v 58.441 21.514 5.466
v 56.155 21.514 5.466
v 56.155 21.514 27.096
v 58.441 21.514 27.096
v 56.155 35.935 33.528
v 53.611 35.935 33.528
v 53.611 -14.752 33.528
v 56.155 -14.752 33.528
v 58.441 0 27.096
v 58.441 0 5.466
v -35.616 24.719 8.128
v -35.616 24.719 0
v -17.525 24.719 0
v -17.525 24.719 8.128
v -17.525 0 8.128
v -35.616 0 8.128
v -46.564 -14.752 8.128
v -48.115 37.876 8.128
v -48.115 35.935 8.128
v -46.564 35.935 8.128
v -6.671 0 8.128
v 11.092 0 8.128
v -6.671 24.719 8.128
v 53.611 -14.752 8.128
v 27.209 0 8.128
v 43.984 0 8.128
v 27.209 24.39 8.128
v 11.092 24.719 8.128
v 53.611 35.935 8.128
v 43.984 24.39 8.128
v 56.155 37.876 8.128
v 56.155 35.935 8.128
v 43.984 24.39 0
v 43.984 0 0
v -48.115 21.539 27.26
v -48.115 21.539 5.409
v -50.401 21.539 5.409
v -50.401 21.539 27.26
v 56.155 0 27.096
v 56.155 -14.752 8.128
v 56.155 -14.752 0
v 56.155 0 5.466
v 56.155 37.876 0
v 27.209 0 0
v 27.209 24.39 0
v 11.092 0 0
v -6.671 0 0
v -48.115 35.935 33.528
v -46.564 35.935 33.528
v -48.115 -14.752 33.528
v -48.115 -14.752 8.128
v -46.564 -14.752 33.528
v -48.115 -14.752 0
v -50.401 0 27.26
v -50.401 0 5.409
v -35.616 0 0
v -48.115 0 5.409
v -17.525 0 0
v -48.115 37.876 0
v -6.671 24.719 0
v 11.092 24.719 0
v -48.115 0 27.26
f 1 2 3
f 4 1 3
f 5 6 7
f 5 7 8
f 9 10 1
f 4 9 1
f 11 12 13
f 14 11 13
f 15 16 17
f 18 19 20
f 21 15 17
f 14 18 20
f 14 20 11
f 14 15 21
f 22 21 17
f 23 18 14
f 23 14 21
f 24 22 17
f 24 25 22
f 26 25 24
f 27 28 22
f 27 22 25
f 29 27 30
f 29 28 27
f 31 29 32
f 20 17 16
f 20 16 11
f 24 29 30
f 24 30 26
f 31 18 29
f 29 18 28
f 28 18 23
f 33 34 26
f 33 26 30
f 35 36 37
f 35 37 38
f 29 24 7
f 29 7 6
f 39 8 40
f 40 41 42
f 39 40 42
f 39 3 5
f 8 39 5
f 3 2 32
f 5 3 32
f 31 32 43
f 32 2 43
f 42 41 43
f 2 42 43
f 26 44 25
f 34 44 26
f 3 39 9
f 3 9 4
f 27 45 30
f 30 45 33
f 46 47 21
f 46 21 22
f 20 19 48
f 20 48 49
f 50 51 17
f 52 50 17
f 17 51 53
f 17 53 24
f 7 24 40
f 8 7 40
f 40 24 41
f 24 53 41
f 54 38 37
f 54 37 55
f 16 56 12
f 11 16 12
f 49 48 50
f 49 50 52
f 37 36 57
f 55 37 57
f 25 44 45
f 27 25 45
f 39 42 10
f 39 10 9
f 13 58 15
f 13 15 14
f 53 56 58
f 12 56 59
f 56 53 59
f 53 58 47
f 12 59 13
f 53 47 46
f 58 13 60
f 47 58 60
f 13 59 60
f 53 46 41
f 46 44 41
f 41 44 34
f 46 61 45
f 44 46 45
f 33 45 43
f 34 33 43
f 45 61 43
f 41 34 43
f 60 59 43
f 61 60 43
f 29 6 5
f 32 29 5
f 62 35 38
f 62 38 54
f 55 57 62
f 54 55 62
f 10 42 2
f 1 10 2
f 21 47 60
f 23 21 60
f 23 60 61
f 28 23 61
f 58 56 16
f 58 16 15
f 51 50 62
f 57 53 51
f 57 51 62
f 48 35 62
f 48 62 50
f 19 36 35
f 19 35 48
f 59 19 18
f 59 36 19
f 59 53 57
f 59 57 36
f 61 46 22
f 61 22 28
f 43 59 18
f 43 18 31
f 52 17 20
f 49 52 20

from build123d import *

# Parameters (mm, degrees)
F0_W     = 104.2701750994
F0_H     = 52.628479898
F0_W_2   = 18.0910397321
F0_H_2   = 24.7193295509
F0_W_3   = 17.7621119656
F0_W_4   = 16.775328666
F0_H_3   = 24.3904013187
F1_DEPTH = 8.128
F2_W     = 1.5516094863
F2_H     = 50.6867542863
F2_W_2   = 2.5433897972
F3_DEPTH = 25.4
F4_W     = 21.5143151581
F4_H     = 21.6306117363
F6_DEPTH = 2.286
F5_W     = 21.539459005
F5_H     = 21.8509552069
F7_DEPTH = 2.286


with BuildPart() as f1:
    # F0 (on Top) → F1 (new body)
    with BuildSketch(Plane.XY):
        with Locations((4.019651562, 11.5622095764)):
            Rectangle(F0_W, F0_H)
        with Locations((-26.5706507489, 12.3596647754)):
            Rectangle(F0_W_2, F0_H_2, mode=Mode.SUBTRACT)
        with Locations((2.2105479147, 12.3596647754)):
            Rectangle(F0_W_3, F0_H_2, mode=Mode.SUBTRACT)
        with Locations((35.5967376381, 12.1952006593)):
            Rectangle(F0_W_4, F0_H_3, mode=Mode.SUBTRACT)
    extrude(amount=F1_DEPTH)

    # F2 (on face) → F3 (join)
    with BuildSketch(Plane.XY.offset(8.128)):
        with Locations((-47.3396312445, 10.5913467705)):
            Rectangle(F2_W, F2_H)
        with Locations((54.8830442131, 10.5913467705)):
            Rectangle(F2_W_2, F2_H)
    extrude(amount=F3_DEPTH)

    # F4 (on face) → F6 (join)
    with BuildSketch(Plane.YZ.offset(56.1547391117)):
        with Locations((10.7571575791, 16.2811053451)):
            Rectangle(F4_W, F4_H)
    extrude(amount=F6_DEPTH)

    # F5 (on face) → F7 (join)
    with BuildSketch(Plane(origin=(-48.1154359877, 0, 0), x_dir=(0, -1, 0), z_dir=(-1, 0, 0))):
        with Locations((-10.7697295025, 16.3343714084)):
            Rectangle(F5_W, F5_H)
    extrude(amount=F7_DEPTH)


solid = f1.part
